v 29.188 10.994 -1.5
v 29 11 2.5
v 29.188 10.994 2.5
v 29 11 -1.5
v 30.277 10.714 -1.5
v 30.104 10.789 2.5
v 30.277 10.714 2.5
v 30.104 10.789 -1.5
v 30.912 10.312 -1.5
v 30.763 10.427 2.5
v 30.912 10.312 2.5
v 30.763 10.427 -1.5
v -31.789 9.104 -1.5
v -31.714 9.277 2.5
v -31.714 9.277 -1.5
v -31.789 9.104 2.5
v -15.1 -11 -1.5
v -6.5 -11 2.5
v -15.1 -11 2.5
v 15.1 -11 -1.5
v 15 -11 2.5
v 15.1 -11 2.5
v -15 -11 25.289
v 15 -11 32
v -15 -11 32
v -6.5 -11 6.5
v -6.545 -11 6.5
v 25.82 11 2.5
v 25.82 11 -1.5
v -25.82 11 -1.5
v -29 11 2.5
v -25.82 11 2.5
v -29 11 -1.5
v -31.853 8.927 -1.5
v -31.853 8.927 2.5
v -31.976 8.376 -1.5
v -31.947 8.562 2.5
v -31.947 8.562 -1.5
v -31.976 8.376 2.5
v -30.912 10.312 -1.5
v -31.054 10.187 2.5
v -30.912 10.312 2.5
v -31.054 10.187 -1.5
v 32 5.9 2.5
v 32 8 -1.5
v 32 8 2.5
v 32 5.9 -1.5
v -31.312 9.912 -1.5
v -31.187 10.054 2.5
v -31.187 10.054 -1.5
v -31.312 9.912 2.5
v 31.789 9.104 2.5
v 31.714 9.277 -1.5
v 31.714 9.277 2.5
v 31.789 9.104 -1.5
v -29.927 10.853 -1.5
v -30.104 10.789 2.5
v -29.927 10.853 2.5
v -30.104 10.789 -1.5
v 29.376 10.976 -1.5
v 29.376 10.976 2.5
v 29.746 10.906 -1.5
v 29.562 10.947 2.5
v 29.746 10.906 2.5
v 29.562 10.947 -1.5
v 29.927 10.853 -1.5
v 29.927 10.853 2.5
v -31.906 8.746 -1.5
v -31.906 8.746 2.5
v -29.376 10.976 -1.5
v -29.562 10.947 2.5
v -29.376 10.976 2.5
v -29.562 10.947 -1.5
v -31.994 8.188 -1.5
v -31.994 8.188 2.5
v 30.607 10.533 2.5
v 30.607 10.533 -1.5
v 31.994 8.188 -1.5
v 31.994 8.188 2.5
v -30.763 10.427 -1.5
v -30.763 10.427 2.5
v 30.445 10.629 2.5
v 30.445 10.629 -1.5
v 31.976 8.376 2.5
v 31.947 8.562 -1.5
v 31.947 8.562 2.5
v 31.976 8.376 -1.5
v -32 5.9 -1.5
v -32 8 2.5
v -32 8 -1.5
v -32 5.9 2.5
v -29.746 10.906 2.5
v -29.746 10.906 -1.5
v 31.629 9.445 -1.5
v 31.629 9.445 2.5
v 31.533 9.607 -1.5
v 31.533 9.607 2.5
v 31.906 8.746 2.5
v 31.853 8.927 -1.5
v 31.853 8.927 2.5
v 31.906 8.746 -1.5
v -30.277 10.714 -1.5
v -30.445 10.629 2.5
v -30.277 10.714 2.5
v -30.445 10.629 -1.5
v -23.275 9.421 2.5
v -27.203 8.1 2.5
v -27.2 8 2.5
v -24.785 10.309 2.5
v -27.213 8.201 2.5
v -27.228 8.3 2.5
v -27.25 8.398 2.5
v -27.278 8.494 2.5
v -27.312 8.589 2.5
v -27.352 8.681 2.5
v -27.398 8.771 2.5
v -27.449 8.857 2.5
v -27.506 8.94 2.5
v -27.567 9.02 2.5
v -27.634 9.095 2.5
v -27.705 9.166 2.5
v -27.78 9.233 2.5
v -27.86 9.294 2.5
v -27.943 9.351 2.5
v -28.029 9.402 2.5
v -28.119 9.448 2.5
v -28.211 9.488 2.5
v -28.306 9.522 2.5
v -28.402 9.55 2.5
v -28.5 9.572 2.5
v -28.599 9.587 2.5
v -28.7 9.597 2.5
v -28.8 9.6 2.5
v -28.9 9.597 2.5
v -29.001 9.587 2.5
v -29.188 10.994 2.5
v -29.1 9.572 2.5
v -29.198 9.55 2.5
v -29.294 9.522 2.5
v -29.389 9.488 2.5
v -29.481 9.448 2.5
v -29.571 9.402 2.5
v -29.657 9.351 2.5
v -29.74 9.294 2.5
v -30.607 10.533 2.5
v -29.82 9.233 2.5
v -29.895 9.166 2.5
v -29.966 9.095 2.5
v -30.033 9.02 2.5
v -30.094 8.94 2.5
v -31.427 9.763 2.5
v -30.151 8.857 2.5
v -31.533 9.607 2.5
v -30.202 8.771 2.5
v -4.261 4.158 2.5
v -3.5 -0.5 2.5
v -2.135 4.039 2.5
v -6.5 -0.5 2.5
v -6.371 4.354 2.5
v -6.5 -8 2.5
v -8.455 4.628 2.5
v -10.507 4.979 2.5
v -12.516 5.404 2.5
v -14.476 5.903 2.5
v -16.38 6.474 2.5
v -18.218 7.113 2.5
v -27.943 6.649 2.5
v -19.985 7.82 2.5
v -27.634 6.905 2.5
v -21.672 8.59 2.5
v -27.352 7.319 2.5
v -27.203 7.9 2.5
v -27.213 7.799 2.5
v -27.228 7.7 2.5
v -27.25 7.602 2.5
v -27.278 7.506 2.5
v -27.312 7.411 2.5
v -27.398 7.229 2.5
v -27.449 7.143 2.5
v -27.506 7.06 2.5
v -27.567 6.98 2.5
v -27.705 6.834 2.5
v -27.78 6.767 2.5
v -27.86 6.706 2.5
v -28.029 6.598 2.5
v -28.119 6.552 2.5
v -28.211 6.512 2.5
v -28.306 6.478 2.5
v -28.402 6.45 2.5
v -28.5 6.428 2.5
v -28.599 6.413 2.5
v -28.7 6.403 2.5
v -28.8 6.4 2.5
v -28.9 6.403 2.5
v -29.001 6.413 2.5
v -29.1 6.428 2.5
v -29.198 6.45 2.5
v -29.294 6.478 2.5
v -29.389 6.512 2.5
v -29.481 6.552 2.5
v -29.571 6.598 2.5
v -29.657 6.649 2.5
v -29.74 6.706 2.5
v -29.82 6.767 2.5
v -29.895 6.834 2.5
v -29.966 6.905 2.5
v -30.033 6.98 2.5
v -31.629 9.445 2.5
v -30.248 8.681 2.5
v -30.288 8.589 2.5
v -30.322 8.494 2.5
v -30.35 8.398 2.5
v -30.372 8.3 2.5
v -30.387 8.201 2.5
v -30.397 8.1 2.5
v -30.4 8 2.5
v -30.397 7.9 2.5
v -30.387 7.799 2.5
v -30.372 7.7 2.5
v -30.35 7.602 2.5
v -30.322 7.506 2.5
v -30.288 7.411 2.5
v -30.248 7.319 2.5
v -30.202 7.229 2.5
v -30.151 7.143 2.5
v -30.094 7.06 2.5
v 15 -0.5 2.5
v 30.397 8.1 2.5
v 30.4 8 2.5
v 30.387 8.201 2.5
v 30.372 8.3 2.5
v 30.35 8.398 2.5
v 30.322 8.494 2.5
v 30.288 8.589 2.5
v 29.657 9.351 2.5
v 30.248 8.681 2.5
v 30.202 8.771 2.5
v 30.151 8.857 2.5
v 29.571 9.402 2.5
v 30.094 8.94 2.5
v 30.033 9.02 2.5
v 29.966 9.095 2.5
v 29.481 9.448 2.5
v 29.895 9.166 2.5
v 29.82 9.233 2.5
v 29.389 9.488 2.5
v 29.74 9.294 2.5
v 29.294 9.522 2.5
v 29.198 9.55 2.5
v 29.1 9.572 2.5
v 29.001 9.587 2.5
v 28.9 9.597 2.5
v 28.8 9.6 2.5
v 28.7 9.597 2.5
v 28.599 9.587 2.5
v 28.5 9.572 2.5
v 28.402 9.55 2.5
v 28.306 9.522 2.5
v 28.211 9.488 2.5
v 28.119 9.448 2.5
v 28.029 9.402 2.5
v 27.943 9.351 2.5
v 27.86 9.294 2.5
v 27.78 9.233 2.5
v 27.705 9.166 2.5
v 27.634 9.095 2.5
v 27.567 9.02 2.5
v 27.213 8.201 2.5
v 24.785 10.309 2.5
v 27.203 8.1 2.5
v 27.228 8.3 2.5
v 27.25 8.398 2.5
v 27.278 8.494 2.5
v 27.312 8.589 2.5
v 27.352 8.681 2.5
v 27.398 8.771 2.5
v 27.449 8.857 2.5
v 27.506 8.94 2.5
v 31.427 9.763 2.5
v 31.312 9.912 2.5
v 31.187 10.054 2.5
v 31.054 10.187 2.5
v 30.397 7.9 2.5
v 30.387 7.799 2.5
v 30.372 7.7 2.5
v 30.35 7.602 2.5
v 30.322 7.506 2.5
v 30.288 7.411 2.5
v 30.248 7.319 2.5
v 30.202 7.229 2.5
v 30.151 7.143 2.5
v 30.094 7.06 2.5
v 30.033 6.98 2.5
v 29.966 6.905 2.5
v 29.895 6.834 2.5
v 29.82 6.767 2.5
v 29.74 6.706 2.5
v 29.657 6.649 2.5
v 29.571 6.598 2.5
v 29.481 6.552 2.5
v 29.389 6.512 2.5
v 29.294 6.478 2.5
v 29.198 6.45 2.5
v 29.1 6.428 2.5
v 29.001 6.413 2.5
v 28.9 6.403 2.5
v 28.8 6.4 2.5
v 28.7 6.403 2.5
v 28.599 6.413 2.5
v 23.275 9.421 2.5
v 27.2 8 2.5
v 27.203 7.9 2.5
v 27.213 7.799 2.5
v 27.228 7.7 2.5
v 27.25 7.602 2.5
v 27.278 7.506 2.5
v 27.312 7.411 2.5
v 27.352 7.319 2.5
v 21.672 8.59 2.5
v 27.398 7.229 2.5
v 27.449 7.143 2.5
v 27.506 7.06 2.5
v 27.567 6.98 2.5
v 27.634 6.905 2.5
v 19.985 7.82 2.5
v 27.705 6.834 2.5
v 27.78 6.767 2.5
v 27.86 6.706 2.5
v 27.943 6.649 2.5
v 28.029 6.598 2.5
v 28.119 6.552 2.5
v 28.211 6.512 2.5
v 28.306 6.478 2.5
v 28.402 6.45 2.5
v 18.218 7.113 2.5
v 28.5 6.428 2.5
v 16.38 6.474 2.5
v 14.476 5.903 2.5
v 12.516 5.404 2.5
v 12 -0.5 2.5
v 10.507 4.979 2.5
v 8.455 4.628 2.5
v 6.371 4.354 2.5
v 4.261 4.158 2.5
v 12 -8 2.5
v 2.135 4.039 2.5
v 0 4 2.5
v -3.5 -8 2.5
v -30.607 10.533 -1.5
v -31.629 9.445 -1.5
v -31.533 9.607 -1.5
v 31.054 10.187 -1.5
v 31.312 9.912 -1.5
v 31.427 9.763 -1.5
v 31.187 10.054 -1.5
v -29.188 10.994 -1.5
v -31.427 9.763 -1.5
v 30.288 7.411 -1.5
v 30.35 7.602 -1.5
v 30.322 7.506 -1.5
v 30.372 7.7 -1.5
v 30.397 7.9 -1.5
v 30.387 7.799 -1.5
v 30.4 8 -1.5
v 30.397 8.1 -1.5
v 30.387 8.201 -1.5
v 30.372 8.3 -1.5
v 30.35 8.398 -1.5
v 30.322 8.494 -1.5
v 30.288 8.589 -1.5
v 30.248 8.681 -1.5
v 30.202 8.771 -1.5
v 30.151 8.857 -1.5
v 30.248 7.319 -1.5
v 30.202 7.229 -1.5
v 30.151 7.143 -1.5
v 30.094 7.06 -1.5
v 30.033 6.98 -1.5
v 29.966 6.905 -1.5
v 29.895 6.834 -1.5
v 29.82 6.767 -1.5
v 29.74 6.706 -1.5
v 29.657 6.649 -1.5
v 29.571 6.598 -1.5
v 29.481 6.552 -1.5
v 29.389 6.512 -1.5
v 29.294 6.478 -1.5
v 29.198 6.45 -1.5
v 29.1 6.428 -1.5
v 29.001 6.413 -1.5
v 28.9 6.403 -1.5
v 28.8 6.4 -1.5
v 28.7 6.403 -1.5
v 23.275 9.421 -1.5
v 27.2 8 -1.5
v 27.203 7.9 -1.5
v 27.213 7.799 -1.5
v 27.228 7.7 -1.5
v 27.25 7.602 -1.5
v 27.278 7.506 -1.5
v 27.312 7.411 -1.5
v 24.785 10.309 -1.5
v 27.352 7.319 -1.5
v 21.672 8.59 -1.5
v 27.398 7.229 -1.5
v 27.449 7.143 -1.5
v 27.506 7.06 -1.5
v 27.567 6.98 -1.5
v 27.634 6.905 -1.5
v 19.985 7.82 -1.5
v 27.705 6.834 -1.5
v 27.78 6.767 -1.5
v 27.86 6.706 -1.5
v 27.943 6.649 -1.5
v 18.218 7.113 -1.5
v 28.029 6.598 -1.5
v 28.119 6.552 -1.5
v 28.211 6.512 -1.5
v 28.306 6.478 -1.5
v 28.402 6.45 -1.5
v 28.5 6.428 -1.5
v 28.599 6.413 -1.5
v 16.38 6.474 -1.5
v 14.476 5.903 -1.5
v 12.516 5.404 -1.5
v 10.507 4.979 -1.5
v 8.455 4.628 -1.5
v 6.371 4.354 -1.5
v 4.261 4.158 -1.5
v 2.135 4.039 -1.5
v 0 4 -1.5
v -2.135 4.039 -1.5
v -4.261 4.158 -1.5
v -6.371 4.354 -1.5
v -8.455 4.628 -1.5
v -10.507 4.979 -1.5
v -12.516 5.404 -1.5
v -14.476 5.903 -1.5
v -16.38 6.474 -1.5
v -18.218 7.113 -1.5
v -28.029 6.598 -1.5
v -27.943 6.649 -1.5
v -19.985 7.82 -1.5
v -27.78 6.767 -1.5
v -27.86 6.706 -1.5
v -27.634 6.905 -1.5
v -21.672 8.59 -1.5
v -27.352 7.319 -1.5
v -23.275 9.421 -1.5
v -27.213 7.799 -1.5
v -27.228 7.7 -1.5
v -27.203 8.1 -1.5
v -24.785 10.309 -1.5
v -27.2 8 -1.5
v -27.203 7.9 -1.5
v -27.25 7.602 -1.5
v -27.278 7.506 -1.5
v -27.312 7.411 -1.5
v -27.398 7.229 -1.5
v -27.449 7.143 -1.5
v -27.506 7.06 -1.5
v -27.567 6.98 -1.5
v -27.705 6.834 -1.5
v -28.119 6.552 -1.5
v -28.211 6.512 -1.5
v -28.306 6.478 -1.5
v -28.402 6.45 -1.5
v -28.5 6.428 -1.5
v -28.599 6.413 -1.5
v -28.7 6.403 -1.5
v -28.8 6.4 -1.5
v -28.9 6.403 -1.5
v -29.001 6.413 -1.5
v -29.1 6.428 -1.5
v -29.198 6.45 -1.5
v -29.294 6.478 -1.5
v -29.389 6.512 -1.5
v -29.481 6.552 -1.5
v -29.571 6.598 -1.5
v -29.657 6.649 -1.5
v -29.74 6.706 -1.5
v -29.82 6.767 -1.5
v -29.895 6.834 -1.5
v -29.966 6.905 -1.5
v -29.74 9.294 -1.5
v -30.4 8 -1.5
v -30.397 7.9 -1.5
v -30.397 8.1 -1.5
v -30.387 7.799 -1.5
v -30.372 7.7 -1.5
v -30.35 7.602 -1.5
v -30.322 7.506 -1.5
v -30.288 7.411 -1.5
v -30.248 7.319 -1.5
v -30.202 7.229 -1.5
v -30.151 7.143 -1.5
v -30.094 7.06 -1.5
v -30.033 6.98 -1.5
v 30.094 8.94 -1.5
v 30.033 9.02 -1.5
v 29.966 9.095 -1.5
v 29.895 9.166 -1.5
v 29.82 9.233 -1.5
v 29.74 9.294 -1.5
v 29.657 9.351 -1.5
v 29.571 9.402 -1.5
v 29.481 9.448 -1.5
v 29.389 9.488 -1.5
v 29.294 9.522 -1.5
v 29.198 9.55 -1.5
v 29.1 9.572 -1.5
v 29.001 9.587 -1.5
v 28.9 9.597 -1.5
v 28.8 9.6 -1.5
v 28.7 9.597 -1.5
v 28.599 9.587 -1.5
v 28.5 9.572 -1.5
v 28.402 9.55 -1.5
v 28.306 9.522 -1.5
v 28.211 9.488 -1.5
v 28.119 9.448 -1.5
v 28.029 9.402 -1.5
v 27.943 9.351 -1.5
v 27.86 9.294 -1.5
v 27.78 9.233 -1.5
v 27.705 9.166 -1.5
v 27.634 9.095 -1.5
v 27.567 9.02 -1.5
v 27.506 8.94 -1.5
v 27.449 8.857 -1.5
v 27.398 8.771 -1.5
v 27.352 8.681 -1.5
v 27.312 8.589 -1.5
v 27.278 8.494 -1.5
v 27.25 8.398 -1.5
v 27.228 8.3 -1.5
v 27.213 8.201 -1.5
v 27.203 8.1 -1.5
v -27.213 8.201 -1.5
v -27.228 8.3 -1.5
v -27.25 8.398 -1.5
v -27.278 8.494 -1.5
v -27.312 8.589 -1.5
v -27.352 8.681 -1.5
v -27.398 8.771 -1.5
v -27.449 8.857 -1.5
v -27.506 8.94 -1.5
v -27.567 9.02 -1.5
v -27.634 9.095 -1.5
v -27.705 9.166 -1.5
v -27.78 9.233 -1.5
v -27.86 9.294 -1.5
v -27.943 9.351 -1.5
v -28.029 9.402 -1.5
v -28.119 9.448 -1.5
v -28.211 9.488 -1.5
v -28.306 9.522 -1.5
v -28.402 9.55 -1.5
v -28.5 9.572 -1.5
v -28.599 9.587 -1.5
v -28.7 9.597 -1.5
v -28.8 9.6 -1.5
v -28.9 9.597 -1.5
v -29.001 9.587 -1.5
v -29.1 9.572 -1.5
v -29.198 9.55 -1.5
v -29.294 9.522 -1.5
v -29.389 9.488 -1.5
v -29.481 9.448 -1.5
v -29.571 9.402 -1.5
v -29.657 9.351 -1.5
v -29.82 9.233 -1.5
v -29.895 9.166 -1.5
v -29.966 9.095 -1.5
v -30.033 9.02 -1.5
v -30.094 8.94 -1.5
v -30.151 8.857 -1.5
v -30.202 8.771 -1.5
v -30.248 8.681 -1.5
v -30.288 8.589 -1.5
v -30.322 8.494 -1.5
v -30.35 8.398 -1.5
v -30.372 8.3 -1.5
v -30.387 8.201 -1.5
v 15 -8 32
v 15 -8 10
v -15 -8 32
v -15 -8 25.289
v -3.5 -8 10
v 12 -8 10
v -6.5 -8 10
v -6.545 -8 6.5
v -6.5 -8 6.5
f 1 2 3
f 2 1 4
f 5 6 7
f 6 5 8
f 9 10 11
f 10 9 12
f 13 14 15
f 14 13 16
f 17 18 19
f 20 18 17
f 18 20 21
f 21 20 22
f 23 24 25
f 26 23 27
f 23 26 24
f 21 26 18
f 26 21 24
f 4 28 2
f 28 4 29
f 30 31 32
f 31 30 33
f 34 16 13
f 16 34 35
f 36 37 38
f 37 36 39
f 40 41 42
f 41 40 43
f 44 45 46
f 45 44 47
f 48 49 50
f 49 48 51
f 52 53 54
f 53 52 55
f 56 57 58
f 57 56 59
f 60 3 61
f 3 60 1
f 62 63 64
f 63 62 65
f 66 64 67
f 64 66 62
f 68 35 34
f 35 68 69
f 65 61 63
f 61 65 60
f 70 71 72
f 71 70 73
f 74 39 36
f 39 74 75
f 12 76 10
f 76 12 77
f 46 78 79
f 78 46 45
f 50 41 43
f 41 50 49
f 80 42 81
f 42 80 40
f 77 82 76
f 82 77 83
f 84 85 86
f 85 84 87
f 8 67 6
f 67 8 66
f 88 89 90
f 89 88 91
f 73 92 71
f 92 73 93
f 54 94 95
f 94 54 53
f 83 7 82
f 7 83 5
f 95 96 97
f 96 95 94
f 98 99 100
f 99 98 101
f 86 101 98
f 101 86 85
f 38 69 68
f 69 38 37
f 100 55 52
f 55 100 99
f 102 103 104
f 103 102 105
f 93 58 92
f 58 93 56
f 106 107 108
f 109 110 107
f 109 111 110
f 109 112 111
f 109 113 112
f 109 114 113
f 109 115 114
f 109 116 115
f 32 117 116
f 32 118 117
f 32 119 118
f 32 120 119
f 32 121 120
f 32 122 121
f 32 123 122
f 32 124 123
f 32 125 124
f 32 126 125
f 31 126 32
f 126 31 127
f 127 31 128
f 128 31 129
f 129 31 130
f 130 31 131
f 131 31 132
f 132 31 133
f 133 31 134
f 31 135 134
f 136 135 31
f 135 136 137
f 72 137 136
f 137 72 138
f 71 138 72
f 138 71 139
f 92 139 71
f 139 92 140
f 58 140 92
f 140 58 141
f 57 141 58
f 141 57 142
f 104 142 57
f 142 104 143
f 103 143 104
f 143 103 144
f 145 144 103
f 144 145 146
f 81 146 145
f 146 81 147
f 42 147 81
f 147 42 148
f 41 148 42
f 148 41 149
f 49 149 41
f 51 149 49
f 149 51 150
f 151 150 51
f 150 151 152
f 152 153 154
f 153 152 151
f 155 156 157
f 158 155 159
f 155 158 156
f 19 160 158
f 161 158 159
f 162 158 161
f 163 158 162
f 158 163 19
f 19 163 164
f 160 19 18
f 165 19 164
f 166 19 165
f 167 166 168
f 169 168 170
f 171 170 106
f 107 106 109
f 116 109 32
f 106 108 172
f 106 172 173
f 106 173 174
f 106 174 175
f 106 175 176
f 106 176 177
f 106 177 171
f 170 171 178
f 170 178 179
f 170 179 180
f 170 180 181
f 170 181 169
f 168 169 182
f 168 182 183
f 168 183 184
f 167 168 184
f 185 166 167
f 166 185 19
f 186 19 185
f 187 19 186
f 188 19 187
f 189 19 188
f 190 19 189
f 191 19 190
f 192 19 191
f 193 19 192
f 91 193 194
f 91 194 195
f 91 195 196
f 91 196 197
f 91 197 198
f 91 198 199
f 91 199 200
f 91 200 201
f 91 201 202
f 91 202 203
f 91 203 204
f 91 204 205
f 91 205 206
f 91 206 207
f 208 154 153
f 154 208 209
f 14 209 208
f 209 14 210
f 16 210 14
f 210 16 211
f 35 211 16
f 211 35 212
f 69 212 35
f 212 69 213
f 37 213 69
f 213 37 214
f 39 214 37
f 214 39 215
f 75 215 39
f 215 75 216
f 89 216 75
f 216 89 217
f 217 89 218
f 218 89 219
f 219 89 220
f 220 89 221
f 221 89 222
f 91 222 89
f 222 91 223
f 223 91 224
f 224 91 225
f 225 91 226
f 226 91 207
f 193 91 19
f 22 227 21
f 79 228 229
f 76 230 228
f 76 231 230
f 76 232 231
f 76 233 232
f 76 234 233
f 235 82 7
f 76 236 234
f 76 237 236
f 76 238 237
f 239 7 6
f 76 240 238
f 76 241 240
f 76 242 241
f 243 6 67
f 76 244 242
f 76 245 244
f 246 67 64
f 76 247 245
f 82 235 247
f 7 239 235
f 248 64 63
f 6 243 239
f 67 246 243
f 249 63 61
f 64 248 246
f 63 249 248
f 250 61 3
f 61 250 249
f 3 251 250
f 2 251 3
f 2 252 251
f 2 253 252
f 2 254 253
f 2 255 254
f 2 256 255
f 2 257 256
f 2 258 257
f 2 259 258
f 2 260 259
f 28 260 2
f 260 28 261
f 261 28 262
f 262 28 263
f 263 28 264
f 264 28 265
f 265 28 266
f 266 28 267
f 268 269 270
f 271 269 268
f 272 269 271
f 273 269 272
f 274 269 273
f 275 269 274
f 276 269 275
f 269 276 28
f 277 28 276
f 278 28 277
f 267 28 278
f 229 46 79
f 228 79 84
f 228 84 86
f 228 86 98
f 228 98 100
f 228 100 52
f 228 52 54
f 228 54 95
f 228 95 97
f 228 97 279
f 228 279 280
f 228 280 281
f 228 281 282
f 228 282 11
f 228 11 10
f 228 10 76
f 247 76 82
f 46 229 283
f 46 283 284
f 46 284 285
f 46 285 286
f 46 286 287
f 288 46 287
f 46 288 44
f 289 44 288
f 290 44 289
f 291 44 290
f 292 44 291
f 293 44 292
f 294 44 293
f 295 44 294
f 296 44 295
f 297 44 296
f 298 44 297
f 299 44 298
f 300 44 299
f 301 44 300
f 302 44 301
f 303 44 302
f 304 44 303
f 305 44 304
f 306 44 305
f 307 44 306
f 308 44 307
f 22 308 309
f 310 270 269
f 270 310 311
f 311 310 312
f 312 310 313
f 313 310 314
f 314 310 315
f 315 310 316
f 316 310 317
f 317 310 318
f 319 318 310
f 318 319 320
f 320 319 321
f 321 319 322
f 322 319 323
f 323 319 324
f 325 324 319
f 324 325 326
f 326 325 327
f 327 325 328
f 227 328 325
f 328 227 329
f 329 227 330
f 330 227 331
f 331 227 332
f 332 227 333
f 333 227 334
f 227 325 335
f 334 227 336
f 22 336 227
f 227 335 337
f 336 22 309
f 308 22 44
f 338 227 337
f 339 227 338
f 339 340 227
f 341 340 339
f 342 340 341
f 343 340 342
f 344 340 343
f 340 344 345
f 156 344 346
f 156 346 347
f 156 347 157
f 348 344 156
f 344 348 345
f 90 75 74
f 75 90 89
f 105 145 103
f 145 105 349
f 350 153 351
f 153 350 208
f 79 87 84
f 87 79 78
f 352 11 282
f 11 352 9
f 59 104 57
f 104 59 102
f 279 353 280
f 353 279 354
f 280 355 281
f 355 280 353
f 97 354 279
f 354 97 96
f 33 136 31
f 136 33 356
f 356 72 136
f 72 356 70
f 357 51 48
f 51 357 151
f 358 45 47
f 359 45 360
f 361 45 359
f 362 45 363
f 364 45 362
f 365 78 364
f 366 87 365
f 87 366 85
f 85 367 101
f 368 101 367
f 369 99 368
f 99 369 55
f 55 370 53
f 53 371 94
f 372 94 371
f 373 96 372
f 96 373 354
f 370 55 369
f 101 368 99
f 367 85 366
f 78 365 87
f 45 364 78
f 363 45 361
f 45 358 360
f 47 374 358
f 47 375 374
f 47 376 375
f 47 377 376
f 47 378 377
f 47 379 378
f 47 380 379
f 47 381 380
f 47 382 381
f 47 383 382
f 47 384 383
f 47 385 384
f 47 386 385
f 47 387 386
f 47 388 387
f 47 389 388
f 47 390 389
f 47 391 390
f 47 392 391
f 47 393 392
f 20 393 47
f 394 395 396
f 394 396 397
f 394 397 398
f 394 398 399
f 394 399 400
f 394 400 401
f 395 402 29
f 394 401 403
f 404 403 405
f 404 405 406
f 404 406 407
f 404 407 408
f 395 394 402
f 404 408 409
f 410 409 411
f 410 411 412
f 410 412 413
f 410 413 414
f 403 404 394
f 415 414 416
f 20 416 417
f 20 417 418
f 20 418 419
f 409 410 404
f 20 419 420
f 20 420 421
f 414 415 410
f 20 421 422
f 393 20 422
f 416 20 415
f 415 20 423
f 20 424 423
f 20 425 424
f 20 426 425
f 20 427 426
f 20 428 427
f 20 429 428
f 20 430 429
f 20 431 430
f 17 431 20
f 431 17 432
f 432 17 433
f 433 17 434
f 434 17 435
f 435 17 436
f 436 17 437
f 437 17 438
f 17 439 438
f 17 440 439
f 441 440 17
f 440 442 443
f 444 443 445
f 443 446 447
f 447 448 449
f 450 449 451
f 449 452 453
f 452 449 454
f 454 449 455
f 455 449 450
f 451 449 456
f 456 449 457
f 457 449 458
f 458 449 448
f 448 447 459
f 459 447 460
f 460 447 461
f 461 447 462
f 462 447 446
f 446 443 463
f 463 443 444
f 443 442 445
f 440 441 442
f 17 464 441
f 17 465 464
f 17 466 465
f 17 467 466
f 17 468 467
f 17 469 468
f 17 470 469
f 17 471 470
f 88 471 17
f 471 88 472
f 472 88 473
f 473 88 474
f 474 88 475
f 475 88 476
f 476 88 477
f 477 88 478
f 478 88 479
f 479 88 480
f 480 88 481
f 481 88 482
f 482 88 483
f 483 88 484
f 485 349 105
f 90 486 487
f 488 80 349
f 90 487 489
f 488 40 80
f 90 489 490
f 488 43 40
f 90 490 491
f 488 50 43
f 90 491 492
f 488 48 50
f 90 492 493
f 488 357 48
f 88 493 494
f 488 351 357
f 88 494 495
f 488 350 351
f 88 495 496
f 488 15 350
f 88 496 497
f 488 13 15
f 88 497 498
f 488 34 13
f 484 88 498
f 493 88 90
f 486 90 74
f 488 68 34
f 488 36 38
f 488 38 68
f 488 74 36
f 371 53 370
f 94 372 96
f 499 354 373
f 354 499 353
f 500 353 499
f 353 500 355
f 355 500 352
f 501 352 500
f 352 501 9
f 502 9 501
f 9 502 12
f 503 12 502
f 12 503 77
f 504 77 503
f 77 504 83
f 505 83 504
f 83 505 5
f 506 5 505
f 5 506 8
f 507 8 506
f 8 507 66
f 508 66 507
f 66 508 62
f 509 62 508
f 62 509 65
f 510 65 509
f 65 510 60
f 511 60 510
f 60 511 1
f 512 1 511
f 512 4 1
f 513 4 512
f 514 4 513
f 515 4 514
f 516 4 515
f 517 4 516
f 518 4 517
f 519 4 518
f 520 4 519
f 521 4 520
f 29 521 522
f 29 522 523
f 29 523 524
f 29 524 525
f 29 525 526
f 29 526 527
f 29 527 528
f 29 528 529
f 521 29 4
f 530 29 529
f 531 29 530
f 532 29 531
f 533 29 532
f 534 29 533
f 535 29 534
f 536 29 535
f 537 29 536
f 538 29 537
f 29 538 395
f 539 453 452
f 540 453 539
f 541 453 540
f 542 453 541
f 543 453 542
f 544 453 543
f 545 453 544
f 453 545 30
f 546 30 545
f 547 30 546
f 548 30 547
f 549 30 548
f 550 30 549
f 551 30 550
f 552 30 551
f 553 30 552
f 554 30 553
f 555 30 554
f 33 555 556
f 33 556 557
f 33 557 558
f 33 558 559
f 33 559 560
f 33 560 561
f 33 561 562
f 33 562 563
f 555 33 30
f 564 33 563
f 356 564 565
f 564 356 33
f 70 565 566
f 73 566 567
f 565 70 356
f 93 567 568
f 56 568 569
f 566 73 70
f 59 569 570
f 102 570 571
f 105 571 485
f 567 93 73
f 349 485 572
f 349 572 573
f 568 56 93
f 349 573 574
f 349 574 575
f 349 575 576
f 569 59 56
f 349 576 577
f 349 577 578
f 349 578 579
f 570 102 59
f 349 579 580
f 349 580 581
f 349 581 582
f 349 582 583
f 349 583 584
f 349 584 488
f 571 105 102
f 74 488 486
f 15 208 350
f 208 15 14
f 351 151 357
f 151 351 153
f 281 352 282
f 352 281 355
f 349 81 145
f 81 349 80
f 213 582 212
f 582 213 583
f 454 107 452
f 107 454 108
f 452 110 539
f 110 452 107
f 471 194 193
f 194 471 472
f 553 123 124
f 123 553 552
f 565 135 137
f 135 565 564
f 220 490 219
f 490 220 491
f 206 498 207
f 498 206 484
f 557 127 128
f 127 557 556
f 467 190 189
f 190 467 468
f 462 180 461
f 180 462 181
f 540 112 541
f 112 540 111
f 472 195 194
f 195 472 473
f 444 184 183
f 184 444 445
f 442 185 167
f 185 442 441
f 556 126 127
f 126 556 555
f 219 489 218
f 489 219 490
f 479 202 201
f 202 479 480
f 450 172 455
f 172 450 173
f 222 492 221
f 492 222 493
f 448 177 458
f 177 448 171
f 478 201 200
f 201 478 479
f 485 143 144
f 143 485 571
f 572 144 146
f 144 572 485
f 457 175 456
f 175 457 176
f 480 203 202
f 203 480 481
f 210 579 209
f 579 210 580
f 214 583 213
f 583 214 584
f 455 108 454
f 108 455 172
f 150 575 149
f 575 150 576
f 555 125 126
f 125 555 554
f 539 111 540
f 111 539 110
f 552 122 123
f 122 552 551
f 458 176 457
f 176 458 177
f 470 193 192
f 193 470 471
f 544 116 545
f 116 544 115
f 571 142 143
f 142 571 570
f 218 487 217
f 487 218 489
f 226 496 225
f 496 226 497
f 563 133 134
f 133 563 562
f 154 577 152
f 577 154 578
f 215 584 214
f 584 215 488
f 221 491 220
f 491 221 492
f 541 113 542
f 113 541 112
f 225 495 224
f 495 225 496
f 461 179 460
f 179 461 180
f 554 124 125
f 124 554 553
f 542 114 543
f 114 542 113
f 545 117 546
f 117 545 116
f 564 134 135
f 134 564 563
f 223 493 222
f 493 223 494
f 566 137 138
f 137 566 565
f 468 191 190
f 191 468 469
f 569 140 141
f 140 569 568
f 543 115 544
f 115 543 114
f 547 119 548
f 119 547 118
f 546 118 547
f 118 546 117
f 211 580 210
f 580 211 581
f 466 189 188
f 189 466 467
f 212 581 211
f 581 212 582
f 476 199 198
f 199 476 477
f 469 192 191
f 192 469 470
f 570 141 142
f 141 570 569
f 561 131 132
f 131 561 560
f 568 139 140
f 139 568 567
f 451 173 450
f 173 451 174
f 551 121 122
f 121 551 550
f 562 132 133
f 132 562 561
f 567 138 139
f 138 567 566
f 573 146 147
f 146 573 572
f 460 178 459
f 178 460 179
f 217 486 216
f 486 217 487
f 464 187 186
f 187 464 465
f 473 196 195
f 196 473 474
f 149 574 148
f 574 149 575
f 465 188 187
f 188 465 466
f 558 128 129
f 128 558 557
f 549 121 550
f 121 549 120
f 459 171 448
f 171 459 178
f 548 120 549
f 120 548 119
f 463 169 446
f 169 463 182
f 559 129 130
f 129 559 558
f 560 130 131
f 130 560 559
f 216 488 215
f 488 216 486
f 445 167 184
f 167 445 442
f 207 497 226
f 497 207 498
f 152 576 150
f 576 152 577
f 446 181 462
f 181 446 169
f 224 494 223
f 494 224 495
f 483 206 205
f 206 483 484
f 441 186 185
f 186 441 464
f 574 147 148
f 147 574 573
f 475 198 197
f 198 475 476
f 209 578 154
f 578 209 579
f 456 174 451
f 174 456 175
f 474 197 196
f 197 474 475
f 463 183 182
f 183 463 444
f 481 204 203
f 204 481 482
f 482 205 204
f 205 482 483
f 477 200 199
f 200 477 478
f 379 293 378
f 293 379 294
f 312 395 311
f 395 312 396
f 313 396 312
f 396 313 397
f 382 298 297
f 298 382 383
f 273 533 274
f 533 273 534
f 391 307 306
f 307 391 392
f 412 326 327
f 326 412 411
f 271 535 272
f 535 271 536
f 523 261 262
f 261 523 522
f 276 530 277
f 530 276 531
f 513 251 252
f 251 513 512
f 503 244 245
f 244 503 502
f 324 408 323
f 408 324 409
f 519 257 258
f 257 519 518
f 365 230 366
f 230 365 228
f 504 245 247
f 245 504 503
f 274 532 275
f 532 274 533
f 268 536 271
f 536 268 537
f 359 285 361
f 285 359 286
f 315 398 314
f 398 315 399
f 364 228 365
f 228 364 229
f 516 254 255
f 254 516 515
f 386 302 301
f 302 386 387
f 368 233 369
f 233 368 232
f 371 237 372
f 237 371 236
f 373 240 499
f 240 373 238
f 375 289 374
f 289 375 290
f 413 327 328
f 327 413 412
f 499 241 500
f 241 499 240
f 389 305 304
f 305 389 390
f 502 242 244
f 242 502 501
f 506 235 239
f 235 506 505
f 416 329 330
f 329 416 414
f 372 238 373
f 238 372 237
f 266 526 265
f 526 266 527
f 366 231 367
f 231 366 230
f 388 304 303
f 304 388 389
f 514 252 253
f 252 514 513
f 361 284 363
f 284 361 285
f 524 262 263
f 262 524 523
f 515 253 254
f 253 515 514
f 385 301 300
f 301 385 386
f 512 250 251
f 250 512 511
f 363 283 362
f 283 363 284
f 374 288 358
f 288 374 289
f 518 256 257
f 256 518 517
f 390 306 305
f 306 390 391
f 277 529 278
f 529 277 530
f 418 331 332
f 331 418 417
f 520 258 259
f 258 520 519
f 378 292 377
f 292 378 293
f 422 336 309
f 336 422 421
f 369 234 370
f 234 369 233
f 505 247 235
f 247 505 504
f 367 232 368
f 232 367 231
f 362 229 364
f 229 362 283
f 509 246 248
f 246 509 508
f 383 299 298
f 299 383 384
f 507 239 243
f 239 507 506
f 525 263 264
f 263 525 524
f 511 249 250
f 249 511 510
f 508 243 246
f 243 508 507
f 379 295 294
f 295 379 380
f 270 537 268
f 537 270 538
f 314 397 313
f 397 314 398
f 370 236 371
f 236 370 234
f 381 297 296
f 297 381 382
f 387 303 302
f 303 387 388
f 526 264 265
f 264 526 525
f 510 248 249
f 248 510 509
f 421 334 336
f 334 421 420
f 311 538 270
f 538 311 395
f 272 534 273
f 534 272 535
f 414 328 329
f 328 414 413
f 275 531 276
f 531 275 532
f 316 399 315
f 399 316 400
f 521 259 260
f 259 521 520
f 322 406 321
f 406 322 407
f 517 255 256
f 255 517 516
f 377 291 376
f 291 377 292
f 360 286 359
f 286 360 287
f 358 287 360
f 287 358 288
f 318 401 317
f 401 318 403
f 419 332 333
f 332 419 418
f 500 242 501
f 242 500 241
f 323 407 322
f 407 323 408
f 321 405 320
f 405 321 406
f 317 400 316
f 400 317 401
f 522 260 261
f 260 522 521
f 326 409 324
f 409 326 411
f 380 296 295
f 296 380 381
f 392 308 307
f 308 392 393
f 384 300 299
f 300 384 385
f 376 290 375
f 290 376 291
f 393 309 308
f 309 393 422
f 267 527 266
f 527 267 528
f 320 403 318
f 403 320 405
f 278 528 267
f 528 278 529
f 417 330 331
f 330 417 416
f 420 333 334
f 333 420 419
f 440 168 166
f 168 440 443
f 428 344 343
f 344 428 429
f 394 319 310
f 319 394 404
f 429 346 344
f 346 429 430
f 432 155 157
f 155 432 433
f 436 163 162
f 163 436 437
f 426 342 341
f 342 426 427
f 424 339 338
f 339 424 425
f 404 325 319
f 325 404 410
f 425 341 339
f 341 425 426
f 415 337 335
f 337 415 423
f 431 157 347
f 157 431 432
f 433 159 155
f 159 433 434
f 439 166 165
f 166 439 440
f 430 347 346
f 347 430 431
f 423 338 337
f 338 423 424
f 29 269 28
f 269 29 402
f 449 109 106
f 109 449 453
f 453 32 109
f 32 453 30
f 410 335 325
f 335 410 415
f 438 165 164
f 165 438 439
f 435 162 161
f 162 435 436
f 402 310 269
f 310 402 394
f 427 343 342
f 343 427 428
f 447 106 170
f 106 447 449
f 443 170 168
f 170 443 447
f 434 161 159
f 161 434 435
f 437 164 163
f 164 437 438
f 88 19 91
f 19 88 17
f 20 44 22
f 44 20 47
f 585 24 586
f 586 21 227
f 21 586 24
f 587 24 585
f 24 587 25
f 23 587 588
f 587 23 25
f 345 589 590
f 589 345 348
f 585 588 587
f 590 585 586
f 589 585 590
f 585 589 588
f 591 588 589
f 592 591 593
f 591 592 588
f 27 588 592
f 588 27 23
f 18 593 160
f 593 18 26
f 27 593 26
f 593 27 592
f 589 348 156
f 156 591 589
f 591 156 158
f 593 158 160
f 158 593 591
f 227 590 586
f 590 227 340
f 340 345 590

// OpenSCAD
fn = 100;

module triangle(o_len, a_len, depth)
{
    linear_extrude(height=depth)
    {
        polygon(points=[[0,0],[a_len,0],[0,o_len]], paths=[[0,1,2]]);
    }
}

//the Board

difference()
{
    minkowski()
    {
        cube([58,16,3],true);
        cylinder(r=3,h=1,$fn=fn);
    }
   
    //screw hole
	translate([-(30.4-1.6),8,0])
	{
		cylinder(h=8,d=3.2,center=true,$fn=fn);
	}

    //screw hole
	translate([(30.4-1.6),8,0])
	{
		cylinder(h=8,d=3.2,center=true,$fn=fn);
	}
    
    //big arc cutout
    translate([0,24,0])
	{
        scale([1.7,1,1])
        {
		cylinder(h=8,d=40,center=true,$fn=fn);
        }
	}
    
    //front corner cut off
    translate([-33,-11.1,-3])
	{
		triangle(18,18,8);
	}
    
    //front corner cut off
    translate([33,-11.1,3])
	{
        rotate([0,180,0])
        {
            triangle(18,18,8);
        }
	}
}


//The camera mount
translate([0,-9.5,17])
{
    rotate([0,0,0])
    {
        difference()
        {
            cube([30,3,30], true);
            translate([-15.5,7,-10.6])
            {
                rotate([90,0,0])
                {
                triangle(20,9,15);
                }
            }
            translate([-11,0,-13])
            {
                cube([9,30,5],true);
            }
        }
        
    }
}


//second support triangle
translate([-3.5,-8,0])
{
	rotate([0,-90,0])
	{
		triangle(10,10,3);
	}
}

//second support triangle
translate([15,-8,0])
{
	rotate([0,-90,0])
	{
		triangle(10,10,3);
	}
}
